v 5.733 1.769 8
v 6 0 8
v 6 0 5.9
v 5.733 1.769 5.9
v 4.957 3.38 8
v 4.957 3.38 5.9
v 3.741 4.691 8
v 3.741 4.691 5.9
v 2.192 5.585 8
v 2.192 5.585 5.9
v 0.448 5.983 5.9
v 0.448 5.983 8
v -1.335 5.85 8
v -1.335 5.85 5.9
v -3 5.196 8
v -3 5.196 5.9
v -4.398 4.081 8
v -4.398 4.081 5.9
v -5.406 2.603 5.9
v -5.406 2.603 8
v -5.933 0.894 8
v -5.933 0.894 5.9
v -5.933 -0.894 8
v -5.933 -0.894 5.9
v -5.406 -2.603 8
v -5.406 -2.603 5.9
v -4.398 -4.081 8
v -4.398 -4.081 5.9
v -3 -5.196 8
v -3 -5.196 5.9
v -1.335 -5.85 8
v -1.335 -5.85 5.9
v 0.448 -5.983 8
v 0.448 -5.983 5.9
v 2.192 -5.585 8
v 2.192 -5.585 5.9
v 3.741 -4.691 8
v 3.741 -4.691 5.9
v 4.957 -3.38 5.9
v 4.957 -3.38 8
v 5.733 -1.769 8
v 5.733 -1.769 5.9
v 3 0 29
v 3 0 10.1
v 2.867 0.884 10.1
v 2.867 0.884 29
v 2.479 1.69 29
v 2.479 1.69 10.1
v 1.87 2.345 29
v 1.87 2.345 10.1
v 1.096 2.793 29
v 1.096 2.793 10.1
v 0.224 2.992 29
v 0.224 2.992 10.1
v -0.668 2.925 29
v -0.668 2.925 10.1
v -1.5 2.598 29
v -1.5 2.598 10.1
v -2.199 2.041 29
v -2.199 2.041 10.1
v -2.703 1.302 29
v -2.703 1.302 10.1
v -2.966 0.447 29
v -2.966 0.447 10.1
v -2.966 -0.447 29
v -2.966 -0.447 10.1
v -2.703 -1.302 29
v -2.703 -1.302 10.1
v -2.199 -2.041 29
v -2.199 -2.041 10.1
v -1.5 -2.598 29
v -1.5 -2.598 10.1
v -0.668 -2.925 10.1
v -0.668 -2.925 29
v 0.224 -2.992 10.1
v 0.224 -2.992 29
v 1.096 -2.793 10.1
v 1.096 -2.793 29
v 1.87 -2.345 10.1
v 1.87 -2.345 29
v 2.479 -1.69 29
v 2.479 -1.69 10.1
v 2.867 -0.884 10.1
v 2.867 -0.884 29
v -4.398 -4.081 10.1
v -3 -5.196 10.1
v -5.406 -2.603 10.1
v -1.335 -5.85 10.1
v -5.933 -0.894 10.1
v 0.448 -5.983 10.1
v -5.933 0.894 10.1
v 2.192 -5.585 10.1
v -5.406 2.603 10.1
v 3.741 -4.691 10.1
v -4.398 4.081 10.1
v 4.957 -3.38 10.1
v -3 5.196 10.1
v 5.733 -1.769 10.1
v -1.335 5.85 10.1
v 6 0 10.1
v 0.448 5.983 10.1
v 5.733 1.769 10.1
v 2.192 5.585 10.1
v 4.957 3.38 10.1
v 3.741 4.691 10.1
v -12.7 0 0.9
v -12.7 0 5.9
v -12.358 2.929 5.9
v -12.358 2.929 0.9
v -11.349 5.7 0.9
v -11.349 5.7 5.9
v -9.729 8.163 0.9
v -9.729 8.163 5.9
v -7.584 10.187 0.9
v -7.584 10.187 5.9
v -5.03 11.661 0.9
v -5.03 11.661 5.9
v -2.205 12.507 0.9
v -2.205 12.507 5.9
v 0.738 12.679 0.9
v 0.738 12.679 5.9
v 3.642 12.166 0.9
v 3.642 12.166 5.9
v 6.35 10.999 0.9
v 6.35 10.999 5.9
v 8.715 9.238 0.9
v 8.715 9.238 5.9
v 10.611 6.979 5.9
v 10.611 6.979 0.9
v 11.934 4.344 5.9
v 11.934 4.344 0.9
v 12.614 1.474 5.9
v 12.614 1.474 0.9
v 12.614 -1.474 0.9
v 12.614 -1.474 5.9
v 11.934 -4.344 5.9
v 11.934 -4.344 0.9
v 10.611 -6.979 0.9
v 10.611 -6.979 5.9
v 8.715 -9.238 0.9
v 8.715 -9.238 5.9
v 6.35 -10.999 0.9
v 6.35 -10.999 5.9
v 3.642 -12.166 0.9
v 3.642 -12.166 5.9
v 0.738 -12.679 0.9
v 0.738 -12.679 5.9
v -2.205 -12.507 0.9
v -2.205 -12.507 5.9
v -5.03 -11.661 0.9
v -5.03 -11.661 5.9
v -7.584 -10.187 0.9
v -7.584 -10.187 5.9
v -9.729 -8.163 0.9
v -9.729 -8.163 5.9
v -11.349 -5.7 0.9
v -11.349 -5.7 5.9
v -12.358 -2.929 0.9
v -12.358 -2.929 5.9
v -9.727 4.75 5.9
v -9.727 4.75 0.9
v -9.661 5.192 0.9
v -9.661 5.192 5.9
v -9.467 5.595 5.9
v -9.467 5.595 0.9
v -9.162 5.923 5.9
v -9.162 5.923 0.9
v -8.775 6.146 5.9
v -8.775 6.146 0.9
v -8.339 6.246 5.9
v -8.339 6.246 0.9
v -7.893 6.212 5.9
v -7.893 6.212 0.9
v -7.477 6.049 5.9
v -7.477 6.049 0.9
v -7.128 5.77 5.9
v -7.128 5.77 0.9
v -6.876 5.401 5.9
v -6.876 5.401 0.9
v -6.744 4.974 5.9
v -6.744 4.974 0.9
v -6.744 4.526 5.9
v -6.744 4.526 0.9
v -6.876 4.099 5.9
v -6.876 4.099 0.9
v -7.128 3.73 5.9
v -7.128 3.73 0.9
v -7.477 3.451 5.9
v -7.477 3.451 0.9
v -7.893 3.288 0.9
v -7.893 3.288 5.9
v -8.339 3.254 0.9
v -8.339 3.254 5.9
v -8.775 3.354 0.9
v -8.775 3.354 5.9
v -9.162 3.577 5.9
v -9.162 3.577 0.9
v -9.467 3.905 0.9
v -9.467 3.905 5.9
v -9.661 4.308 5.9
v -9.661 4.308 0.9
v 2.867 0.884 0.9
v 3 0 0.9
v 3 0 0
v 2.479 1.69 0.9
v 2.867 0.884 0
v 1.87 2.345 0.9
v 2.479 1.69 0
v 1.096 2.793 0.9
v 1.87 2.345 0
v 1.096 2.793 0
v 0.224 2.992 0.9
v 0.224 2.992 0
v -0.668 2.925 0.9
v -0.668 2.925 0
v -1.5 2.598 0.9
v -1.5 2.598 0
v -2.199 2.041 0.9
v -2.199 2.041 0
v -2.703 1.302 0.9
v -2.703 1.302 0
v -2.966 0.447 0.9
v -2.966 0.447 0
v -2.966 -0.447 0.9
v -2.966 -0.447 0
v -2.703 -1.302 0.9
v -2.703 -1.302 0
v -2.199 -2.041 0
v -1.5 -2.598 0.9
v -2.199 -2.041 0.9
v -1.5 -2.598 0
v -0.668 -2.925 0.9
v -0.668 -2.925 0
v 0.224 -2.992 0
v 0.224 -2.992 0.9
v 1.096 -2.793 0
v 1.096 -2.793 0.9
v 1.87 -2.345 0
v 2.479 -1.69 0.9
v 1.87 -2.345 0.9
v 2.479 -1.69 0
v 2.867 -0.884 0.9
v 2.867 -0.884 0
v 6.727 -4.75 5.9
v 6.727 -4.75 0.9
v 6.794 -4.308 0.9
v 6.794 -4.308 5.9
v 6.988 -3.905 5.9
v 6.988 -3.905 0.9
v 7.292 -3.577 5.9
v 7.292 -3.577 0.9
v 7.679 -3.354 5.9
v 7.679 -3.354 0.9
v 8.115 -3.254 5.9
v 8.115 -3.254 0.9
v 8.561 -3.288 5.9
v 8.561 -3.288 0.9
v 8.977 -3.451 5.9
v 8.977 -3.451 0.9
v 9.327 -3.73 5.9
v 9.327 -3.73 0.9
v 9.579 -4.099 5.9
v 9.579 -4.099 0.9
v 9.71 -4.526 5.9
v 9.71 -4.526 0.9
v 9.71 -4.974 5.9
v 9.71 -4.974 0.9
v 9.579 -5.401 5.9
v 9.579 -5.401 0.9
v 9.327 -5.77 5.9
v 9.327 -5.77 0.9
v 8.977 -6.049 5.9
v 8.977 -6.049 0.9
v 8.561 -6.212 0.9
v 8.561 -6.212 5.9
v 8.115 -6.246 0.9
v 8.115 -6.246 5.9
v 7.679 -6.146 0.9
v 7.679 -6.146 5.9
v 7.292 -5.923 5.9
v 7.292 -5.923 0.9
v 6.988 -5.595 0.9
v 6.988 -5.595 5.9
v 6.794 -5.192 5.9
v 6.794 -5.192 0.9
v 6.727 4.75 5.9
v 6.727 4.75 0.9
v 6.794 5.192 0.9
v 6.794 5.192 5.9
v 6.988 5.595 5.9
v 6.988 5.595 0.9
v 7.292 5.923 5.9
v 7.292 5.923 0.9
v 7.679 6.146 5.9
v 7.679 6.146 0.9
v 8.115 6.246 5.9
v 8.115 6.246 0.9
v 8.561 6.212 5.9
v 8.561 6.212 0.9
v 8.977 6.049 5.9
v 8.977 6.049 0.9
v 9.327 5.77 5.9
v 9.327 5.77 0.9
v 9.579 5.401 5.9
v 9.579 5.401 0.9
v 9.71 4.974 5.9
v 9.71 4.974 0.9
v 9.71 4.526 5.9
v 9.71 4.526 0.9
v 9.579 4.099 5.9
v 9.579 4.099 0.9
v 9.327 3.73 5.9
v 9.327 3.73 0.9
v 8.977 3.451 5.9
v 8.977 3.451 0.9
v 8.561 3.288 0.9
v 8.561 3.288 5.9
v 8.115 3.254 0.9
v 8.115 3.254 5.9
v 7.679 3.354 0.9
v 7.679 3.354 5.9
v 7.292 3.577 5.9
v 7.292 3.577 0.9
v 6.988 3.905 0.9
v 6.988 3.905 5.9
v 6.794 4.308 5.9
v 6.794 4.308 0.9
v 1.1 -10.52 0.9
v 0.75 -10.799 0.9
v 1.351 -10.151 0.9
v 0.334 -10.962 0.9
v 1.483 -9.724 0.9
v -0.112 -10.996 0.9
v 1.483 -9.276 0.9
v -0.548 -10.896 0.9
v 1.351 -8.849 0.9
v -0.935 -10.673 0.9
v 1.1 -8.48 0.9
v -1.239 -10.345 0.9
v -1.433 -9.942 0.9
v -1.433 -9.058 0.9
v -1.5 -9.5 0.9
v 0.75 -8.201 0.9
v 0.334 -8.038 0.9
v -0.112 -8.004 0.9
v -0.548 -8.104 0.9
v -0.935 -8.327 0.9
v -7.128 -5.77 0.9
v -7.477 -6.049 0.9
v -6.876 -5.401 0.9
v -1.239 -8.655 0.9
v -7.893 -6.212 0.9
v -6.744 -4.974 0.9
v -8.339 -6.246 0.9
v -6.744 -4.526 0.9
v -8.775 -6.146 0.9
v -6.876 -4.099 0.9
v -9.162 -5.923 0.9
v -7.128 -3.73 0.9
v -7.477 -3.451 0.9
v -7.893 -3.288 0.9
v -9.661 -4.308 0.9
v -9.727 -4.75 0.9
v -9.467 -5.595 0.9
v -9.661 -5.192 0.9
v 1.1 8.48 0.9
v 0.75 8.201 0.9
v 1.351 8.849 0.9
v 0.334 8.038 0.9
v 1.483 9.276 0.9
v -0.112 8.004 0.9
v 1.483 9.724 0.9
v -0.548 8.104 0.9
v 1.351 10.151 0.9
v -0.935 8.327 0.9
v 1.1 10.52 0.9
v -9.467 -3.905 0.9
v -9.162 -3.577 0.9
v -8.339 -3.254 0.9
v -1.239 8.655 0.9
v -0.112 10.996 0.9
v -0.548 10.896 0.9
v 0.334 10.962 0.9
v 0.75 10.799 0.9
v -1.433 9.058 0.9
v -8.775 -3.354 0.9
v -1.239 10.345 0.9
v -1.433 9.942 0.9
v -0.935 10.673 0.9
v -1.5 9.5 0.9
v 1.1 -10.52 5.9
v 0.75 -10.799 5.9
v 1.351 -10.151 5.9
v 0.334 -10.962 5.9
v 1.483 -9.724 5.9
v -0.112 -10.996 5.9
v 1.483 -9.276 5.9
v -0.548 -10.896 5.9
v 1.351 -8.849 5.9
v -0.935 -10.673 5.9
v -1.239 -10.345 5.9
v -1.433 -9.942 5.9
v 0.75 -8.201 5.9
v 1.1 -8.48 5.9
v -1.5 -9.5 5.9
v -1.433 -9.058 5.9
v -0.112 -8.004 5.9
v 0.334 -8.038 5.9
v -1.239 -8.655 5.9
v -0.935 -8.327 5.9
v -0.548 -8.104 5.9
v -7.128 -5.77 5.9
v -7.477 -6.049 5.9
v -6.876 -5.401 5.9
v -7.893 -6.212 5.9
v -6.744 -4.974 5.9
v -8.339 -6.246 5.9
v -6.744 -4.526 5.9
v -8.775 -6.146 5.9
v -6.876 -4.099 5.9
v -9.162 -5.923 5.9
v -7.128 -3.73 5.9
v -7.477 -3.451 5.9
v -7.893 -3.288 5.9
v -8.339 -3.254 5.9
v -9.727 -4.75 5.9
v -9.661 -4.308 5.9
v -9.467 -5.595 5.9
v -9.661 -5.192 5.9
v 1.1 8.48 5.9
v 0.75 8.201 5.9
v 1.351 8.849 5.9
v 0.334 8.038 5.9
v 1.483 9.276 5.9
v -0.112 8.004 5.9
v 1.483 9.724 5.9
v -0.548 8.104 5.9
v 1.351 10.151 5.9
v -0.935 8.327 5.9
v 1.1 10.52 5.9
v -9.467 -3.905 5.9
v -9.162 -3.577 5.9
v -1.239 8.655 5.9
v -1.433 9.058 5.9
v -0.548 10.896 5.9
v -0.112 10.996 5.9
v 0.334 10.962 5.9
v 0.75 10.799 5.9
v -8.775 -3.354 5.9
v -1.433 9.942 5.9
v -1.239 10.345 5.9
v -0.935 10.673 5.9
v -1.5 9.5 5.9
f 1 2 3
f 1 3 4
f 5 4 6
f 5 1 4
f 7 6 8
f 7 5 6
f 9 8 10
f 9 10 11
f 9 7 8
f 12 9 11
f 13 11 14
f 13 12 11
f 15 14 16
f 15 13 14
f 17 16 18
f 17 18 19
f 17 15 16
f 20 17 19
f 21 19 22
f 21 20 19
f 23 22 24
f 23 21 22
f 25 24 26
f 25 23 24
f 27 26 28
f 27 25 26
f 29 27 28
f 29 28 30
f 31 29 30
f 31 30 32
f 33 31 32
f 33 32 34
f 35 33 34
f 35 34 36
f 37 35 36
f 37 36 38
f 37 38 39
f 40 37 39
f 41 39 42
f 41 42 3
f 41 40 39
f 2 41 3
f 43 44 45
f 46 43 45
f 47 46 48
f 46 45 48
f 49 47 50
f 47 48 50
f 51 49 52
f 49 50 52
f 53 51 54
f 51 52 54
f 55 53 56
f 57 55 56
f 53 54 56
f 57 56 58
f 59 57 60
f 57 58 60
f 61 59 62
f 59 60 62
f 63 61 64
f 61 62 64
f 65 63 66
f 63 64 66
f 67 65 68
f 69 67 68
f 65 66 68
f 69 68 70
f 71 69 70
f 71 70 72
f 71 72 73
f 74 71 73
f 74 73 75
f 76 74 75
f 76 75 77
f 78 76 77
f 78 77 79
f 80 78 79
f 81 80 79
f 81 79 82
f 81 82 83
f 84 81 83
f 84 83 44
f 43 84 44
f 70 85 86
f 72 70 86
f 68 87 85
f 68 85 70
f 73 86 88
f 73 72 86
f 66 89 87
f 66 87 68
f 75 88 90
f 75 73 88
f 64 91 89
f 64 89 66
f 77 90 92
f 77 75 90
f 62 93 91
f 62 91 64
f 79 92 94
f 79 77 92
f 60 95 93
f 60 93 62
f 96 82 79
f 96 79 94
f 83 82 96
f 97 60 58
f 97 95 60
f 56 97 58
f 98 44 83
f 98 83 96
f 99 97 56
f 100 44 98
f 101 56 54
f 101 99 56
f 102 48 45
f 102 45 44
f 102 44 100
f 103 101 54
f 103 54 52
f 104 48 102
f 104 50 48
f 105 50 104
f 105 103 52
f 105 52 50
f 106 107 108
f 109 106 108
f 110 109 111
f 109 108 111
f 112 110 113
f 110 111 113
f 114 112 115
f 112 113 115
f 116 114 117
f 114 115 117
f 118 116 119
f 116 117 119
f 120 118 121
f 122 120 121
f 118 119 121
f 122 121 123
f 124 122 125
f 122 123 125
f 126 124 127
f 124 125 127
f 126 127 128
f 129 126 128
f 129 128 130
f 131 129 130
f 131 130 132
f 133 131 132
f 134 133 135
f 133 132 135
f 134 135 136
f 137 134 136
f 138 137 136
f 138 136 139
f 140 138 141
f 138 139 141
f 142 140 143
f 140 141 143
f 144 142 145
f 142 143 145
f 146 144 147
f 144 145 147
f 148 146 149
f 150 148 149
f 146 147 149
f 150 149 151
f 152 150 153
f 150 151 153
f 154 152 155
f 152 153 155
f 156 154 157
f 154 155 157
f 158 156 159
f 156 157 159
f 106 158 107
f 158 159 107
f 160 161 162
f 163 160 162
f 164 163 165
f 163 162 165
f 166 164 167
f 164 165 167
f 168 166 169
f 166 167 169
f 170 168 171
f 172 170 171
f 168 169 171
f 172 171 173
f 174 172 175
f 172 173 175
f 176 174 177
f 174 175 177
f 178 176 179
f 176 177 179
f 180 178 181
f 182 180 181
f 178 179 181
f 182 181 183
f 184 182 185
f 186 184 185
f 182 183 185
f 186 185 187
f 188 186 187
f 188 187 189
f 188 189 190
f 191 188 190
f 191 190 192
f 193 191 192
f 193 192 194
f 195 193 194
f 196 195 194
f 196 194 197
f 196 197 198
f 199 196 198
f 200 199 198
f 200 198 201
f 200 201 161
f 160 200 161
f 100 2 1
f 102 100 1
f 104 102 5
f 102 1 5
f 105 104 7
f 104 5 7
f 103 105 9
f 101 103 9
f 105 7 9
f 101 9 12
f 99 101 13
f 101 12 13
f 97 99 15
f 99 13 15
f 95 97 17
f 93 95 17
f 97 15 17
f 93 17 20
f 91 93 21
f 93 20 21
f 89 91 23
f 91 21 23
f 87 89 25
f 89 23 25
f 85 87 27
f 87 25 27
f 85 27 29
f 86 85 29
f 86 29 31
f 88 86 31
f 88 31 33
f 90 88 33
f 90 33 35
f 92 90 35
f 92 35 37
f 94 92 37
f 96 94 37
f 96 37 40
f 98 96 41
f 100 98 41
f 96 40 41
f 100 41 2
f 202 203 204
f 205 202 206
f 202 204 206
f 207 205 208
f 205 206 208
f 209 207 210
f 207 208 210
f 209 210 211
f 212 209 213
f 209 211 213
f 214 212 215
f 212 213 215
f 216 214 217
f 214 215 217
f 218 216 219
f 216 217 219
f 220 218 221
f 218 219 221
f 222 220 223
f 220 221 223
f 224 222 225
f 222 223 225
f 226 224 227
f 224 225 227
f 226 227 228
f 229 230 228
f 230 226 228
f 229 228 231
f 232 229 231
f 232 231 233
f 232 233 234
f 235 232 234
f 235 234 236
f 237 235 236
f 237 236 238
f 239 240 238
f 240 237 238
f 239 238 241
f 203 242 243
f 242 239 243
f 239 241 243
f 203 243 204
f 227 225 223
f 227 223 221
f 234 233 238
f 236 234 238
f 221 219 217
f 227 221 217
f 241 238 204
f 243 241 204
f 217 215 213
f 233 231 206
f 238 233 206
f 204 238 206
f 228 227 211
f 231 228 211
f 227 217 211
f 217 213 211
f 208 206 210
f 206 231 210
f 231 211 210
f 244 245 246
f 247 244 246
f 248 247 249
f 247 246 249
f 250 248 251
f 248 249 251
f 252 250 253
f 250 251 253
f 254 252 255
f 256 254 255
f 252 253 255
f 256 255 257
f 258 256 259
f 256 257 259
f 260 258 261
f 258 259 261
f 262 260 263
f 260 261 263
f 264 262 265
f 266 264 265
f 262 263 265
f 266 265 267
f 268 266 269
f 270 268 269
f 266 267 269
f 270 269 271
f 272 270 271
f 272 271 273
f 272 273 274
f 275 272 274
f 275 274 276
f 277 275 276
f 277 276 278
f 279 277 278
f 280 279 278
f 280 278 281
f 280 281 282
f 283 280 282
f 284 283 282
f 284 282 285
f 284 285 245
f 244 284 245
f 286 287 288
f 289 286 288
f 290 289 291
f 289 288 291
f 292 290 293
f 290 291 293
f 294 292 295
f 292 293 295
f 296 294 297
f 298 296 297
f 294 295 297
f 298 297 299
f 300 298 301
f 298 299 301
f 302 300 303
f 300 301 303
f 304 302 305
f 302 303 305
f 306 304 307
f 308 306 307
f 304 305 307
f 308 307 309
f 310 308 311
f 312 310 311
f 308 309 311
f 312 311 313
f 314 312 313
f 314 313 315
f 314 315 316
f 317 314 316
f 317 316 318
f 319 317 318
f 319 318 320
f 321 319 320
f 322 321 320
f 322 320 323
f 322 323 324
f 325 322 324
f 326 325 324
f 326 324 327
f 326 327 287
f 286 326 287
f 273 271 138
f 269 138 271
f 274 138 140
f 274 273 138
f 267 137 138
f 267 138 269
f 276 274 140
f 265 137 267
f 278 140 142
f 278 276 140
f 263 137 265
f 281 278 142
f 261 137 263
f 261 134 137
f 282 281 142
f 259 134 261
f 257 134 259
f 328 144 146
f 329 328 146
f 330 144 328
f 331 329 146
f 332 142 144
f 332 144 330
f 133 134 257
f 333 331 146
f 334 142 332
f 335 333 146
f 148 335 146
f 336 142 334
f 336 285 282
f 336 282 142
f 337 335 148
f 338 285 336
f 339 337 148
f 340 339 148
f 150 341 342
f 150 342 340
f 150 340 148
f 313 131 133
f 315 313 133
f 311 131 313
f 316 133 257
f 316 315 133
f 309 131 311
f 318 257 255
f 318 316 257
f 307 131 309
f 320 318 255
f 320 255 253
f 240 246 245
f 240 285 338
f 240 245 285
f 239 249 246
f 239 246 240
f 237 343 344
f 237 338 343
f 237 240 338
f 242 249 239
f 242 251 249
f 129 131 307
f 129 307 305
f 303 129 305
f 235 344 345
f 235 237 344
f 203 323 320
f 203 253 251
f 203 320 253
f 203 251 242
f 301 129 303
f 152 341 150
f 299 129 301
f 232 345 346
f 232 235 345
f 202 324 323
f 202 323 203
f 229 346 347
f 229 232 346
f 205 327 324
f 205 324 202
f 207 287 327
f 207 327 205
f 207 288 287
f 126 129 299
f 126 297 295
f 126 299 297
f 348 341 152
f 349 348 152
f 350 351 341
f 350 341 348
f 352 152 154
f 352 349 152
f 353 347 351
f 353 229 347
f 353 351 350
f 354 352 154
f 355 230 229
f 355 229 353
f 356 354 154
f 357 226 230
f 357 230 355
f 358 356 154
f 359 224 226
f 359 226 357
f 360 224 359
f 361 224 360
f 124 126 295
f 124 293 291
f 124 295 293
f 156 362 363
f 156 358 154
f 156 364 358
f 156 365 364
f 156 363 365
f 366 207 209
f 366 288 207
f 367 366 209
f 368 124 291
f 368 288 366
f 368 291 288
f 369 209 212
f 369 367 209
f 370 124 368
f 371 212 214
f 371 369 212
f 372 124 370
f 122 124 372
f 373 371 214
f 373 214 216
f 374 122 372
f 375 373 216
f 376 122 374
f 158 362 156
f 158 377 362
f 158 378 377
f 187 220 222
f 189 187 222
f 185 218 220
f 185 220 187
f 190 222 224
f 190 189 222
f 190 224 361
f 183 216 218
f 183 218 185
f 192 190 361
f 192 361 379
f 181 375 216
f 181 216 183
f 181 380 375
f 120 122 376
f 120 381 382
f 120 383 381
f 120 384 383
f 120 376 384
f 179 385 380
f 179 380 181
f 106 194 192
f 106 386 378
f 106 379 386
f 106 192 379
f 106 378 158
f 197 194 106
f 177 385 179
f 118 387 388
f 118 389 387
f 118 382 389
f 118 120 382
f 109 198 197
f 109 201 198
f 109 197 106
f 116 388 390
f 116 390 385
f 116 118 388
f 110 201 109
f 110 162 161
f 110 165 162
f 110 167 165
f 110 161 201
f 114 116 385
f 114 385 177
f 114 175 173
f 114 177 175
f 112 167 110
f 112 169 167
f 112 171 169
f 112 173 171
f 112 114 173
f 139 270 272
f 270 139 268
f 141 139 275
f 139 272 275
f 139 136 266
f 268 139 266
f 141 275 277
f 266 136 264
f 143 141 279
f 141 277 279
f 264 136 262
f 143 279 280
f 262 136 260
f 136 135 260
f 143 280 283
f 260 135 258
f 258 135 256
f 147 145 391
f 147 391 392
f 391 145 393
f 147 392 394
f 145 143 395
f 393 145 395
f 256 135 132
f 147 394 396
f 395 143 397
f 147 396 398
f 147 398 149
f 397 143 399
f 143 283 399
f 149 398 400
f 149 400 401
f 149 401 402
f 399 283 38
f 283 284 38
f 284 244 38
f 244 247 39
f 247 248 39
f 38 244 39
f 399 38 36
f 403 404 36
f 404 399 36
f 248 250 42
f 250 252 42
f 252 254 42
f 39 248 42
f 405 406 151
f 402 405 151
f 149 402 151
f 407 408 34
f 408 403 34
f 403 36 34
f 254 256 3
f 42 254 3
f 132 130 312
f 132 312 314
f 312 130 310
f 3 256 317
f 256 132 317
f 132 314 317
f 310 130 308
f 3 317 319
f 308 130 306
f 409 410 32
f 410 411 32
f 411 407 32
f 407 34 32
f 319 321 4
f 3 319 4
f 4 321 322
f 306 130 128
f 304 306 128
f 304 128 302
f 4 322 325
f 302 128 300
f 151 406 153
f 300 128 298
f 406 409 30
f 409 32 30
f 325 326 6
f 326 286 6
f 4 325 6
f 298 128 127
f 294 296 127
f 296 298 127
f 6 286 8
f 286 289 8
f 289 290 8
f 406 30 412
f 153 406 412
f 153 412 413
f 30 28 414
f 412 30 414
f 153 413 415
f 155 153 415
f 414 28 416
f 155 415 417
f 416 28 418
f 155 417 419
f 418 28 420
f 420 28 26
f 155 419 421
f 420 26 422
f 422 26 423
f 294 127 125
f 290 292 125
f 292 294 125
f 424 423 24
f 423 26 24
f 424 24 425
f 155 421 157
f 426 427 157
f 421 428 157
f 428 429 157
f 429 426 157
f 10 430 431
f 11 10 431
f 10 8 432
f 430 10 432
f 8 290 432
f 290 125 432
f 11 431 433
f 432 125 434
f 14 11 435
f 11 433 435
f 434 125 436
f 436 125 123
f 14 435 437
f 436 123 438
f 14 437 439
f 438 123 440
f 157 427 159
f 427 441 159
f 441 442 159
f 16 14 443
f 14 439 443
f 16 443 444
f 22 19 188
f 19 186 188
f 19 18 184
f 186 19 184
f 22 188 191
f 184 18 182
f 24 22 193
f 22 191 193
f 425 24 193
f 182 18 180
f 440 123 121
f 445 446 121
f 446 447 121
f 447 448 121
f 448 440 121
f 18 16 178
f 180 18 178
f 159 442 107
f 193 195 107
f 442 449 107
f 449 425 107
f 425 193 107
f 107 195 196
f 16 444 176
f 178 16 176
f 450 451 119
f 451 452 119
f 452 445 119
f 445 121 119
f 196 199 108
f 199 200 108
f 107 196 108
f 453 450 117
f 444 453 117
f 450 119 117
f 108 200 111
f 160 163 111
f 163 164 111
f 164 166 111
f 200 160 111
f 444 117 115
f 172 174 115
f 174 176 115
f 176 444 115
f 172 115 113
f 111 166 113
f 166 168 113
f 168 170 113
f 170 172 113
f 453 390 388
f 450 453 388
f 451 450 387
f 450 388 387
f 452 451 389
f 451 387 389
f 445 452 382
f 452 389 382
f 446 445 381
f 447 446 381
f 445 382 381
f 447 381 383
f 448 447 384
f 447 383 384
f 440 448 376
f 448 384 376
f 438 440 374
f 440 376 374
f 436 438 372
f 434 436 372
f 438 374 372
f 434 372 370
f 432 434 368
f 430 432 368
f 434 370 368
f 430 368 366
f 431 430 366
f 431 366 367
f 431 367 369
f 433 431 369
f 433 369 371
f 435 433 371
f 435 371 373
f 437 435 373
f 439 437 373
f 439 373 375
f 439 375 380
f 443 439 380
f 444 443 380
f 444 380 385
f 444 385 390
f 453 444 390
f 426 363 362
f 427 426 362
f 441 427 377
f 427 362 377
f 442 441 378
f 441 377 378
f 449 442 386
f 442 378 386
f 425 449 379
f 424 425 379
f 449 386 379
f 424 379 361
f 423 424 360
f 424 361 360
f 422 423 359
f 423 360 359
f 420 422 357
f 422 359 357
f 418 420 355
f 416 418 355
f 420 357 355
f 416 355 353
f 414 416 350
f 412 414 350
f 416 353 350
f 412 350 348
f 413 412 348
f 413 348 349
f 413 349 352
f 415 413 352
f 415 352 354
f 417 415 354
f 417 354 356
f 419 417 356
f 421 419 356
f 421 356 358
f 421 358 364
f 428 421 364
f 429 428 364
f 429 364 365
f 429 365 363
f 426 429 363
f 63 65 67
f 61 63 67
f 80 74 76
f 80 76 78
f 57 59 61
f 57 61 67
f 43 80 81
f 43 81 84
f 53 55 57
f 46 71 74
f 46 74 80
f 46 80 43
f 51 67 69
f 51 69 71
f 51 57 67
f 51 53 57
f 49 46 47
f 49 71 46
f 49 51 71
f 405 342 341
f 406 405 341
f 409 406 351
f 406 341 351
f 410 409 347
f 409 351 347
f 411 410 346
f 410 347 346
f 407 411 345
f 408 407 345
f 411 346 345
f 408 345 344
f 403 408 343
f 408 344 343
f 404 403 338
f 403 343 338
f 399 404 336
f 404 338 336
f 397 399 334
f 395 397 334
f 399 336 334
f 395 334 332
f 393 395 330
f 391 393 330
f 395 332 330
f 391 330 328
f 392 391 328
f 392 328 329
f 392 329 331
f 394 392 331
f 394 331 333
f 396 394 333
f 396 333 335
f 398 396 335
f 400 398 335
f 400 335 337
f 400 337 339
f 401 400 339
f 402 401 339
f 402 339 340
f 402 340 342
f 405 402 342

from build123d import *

# Parameters (mm, degrees)
SKETCH1_R           = 3
BOSS_EXTRUDE1_DEPTH = 29
SKETCH2_R           = 6
BOSS_EXTRUDE2_DEPTH = 2.1
SKETCH3_R           = 12.7
BOSS_EXTRUDE3_DEPTH = 5
SKETCH4_R           = 6
BOSS_EXTRUDE4_DEPTH = 2.1
SKETCH10_R          = 1.5
CUT_EXTRUDE1_DEPTH  = 10


with BuildPart() as part:
    # Sketch1 → Boss-Extrude1 (new body)
    with BuildSketch(Plane.XY):
        Circle(SKETCH1_R)
    extrude(amount=BOSS_EXTRUDE1_DEPTH)

    # Sketch2 → Boss-Extrude2 (add)
    with BuildSketch(Plane.XY.offset(8)):
        Circle(SKETCH2_R)
    extrude(amount=-BOSS_EXTRUDE2_DEPTH)

    # Sketch3 → Boss-Extrude3 (add)
    with BuildSketch(Plane(origin=(0, 0, 5.9), x_dir=(-1, 0, 0), z_dir=(0, 0, -1))):
        Circle(SKETCH3_R)
    extrude(amount=BOSS_EXTRUDE3_DEPTH)

    # Sketch4 → Boss-Extrude4 (add)
    with BuildSketch(Plane.XY.offset(8)):
        Circle(SKETCH4_R)
    extrude(amount=BOSS_EXTRUDE4_DEPTH)

    # Sketch10 → Cut-Extrude1 (cut)
    with BuildSketch(Plane(origin=(0, 0, 0.9), x_dir=(-1, 0, 0), z_dir=(0, 0, -1))):
        with Locations((8.227241336, 4.75)):
            Circle(SKETCH10_R)
        with Locations((0, 9.5)):
            Circle(SKETCH10_R)
        with Locations((8.227241336, -4.75)):
            Circle(SKETCH10_R)
        with Locations((0, -9.5)):
            Circle(SKETCH10_R)
        with Locations((-8.227241336, -4.75)):
            Circle(SKETCH10_R)
        with Locations((-8.227241336, 4.75)):
            Circle(SKETCH10_R)
    extrude(amount=-CUT_EXTRUDE1_DEPTH, mode=Mode.SUBTRACT)


solid = part.part
